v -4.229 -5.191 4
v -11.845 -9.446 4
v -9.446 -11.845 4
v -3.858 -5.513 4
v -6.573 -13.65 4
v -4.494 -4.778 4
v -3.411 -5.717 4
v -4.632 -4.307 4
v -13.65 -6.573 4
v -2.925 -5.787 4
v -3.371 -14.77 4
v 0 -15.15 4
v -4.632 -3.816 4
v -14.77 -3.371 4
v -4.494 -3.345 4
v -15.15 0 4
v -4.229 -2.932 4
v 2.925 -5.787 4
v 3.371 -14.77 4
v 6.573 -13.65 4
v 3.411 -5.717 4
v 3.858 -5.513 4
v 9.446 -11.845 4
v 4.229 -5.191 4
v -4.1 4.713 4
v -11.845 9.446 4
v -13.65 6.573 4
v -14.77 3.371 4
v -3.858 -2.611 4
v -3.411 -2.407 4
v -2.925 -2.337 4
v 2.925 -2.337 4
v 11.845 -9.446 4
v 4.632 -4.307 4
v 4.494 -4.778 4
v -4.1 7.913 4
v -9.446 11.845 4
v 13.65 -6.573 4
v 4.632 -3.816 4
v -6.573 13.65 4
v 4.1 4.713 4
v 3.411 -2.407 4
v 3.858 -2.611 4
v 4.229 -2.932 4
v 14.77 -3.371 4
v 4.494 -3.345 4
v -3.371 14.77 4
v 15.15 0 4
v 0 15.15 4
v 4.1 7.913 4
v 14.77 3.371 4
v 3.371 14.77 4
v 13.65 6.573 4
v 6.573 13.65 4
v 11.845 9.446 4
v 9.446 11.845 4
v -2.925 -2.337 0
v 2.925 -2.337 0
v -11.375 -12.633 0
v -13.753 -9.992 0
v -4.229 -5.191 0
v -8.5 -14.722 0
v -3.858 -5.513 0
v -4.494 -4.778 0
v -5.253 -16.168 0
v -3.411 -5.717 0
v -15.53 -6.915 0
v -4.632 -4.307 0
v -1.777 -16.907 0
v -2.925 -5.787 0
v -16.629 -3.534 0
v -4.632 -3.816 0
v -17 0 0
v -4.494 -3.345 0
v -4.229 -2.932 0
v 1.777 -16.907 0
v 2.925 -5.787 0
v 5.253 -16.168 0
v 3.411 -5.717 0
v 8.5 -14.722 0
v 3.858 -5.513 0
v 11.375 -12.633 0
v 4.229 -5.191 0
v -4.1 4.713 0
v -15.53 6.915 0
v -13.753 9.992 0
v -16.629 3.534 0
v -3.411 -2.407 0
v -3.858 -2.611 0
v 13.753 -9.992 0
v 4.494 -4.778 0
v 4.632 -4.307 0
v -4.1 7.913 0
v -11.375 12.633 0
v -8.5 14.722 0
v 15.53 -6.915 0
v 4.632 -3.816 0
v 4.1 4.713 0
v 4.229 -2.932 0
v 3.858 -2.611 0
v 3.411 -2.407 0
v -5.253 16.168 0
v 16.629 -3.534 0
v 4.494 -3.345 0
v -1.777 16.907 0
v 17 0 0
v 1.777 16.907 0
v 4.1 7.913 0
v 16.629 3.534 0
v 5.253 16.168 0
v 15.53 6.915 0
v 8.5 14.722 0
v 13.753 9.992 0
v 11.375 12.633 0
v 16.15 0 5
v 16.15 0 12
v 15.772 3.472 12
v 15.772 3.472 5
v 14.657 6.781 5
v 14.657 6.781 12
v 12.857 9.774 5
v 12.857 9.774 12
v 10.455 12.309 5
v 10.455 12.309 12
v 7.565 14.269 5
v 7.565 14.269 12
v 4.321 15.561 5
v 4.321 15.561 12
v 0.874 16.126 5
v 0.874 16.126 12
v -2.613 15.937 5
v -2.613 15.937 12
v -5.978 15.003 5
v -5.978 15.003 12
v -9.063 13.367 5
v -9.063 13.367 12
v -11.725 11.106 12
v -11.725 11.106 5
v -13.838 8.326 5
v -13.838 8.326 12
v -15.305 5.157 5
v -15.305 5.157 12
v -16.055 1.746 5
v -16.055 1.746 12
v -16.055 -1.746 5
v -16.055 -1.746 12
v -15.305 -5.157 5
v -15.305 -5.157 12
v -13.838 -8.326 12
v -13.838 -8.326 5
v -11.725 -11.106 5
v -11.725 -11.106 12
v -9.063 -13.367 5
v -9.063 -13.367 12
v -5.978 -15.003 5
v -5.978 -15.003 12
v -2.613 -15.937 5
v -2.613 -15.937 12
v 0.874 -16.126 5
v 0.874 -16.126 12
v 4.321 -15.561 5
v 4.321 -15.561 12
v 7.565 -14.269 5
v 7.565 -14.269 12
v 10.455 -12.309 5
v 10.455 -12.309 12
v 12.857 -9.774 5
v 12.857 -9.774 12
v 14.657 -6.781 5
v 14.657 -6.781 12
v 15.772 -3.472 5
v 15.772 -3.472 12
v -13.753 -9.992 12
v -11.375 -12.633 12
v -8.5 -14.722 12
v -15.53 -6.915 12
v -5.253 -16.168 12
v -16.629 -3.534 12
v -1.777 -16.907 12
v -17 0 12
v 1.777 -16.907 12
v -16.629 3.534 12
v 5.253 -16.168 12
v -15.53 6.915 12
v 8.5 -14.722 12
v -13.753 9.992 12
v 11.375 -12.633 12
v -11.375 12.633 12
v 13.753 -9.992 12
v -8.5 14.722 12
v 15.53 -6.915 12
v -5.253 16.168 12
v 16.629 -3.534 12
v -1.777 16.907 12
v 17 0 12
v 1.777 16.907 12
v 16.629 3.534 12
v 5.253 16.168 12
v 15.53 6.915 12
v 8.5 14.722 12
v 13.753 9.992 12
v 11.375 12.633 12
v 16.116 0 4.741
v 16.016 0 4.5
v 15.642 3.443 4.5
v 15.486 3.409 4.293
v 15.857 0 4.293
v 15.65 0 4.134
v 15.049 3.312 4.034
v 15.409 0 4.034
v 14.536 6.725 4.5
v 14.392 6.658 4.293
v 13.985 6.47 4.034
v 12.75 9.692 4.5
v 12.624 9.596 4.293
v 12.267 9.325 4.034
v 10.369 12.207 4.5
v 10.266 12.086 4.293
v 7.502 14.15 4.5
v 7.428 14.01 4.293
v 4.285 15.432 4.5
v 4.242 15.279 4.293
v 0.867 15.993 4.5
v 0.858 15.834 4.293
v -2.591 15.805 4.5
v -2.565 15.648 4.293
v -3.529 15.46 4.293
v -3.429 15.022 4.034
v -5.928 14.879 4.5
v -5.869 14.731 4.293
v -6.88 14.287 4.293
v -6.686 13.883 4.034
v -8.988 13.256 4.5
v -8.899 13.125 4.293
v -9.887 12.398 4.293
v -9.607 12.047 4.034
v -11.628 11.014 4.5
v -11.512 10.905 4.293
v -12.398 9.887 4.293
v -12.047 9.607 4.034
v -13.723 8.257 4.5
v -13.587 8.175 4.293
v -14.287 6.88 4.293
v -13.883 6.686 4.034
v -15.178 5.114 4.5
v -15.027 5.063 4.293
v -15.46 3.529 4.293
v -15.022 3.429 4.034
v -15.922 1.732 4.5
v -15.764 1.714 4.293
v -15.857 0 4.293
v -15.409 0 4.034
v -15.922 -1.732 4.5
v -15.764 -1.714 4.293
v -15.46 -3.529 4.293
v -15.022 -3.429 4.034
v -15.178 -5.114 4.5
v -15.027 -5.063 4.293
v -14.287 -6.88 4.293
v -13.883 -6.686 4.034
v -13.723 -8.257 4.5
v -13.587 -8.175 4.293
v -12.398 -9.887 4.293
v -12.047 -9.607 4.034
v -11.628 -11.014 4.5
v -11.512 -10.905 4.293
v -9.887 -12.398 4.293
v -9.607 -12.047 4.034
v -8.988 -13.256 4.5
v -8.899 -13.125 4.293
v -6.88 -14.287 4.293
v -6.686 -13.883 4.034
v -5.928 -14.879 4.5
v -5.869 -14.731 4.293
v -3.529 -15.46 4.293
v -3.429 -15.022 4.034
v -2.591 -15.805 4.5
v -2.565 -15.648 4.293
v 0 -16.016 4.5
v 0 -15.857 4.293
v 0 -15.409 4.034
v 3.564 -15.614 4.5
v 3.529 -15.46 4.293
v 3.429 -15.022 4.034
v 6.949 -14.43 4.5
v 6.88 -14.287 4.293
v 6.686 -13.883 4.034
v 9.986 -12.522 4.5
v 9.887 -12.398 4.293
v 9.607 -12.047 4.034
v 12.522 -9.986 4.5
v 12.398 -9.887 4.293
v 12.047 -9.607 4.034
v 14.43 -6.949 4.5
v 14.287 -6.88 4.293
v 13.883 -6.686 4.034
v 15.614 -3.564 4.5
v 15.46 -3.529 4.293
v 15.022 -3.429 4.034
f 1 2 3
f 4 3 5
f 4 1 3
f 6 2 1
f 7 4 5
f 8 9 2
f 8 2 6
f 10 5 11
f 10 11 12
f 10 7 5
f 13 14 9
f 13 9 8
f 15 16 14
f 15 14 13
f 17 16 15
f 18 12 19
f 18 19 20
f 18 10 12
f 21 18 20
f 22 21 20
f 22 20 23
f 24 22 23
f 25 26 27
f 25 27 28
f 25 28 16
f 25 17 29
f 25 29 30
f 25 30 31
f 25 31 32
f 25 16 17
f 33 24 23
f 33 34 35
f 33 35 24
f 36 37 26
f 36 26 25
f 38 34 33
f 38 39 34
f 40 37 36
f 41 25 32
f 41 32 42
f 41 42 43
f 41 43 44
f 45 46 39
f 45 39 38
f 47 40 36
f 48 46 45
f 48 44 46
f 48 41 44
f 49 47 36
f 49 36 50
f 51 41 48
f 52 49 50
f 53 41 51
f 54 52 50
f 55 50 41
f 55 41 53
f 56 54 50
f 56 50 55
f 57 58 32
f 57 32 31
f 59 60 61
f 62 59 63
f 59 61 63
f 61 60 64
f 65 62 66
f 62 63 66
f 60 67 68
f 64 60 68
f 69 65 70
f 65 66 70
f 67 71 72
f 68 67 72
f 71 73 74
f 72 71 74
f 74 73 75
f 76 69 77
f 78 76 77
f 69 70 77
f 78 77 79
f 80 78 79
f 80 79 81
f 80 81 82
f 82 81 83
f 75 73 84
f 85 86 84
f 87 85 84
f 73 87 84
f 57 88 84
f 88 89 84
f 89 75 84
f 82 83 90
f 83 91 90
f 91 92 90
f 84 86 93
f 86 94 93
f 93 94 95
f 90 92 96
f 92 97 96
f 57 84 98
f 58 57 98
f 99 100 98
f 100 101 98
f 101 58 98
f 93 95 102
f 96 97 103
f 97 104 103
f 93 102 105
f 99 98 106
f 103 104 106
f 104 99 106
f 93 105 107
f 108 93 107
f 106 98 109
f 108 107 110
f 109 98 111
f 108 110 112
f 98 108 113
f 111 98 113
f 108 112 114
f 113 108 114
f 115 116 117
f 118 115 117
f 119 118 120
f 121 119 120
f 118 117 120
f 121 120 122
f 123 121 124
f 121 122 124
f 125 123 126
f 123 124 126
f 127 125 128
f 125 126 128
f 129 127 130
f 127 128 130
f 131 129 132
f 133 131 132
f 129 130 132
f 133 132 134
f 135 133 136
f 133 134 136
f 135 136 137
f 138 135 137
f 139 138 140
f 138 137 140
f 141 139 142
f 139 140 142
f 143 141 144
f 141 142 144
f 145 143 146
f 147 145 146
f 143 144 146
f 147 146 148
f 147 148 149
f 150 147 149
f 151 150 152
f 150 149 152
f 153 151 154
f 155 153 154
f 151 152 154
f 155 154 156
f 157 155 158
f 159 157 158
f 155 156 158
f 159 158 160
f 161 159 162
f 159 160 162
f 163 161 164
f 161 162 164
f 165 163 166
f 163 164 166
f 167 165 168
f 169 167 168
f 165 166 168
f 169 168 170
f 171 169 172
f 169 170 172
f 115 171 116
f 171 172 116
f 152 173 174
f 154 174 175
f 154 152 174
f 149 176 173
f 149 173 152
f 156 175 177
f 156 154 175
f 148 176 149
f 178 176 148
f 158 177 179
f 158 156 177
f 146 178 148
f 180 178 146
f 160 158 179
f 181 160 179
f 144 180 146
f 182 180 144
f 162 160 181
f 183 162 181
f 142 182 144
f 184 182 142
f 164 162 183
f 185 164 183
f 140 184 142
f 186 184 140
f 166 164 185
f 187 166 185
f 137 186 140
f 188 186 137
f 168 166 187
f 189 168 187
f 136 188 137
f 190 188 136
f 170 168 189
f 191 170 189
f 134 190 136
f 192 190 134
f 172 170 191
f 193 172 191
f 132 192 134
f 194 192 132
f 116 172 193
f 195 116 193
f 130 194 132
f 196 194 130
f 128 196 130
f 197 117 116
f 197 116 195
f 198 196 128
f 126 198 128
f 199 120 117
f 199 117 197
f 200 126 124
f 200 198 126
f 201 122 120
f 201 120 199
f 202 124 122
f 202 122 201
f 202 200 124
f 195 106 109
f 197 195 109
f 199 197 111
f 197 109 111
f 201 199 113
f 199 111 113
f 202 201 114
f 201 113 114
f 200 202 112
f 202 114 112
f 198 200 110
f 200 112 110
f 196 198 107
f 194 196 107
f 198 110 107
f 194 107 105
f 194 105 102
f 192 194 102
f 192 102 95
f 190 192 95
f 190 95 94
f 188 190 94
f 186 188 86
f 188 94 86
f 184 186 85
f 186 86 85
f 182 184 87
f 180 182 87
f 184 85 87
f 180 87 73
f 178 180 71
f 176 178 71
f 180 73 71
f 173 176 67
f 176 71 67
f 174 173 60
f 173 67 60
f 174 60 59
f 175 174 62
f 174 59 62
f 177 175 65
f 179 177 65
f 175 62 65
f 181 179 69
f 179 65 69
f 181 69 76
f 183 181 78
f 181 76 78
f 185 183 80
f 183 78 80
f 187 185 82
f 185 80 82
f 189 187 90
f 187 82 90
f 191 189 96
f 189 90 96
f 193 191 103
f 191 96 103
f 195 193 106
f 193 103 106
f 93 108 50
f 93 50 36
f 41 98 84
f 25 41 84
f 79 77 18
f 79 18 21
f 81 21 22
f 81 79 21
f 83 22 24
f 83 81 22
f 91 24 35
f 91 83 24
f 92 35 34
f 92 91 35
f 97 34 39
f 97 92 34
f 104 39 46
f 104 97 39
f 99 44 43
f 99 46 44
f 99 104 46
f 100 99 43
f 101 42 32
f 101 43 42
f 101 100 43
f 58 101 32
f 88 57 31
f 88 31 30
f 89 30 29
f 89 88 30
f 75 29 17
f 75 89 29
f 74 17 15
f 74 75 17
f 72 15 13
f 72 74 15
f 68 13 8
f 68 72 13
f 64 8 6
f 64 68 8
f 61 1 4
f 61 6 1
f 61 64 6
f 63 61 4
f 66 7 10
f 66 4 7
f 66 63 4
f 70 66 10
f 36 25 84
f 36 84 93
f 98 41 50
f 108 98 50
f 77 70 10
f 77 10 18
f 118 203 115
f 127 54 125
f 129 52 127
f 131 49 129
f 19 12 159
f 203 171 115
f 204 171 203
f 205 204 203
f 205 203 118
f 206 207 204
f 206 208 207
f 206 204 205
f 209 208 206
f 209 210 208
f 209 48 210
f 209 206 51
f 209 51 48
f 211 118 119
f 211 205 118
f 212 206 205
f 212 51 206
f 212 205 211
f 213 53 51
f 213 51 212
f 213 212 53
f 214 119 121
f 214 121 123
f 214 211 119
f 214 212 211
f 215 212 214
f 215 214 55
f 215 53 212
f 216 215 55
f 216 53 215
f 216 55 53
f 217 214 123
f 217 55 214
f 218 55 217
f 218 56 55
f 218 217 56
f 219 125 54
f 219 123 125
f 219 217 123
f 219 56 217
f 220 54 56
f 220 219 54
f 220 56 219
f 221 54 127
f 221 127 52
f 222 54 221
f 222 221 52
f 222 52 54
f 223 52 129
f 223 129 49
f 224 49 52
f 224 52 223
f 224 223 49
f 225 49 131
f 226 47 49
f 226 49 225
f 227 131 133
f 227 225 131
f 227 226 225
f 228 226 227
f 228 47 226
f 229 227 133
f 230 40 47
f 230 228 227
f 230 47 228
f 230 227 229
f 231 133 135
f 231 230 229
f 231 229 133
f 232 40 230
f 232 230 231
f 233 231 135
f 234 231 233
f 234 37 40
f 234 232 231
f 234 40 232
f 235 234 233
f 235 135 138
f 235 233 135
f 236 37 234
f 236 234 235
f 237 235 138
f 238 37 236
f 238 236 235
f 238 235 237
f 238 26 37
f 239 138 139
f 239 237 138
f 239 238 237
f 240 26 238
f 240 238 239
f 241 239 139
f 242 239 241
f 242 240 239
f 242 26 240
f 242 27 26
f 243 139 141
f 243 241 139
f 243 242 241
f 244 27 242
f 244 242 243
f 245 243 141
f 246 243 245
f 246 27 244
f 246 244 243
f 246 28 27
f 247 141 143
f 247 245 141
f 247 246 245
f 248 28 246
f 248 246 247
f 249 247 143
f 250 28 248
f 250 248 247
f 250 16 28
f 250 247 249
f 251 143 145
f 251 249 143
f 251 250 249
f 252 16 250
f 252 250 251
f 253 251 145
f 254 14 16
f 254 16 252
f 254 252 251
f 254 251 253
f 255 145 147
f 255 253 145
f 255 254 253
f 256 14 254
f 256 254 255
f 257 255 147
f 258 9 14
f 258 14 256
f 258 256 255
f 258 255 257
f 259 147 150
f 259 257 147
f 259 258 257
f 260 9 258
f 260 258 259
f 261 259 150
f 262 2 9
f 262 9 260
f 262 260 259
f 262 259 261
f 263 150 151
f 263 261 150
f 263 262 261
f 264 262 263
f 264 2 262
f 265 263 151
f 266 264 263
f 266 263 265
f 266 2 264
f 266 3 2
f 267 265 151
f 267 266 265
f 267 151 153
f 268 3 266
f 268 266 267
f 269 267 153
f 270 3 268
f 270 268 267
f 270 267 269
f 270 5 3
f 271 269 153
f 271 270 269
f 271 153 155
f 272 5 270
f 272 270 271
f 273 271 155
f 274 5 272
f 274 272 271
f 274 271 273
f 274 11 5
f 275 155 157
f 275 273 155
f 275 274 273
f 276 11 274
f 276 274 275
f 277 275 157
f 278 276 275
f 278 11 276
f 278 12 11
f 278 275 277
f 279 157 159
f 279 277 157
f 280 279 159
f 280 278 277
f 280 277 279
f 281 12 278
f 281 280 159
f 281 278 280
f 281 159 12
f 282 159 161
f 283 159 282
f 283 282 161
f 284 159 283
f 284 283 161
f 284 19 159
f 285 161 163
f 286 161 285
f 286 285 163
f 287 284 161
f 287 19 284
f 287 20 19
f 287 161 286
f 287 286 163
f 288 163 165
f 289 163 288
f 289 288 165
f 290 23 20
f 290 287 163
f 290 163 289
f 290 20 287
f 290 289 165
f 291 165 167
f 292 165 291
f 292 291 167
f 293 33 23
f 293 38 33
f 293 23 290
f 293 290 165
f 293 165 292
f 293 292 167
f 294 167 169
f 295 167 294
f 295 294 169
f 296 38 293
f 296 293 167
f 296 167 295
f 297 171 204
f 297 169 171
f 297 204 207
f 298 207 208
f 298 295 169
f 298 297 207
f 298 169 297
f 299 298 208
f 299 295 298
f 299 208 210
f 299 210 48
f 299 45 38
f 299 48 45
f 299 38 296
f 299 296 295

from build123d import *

# Parameters (mm, degrees)
SKETCH2_R           = 17
BOSS_EXTRUDE1_DEPTH = 12
SKETCH3_R           = 16.15
SKETCH3_R_2         = 10
CUT_EXTRUDE1_DEPTH  = 8
FILLET1_R           = 1
SKETCH4_W           = 8.2
SKETCH4_H           = 3.2
CUT_EXTRUDE2_DEPTH  = 27.870057685


with BuildPart() as part:
    # Sketch2 → Boss-Extrude1 (new body)
    with BuildSketch(Plane.XY):
        Circle(SKETCH2_R)
    extrude(amount=BOSS_EXTRUDE1_DEPTH)

    # Sketch3 → Cut-Extrude1 (cut)
    # profile 1 of 2: a face of its own
    with BuildSketch(Plane.XY.offset(12)):
        Circle(SKETCH3_R)
        Circle(SKETCH3_R_2, mode=Mode.SUBTRACT)
    # profile 2 of 2: a face of its own
    with BuildSketch(Plane.XY.offset(12)):
        Circle(SKETCH3_R_2)
    extrude(amount=-CUT_EXTRUDE1_DEPTH, mode=Mode.SUBTRACT)

    # Fillet1
    fillet1_edges = [part.edges().sort_by_distance(p)[0] for p in [
        (-16.15, 0, 4),
    ]]
    fillet(fillet1_edges, radius=FILLET1_R)

    # Sketch4 → Cut-Extrude2 (cut, through all)
    with BuildSketch(Plane(origin=(0, 0, 0), x_dir=(-1, 0, 0), z_dir=(0, 0, -1))):
        with Locations((0, 6.312686907)):
            Rectangle(SKETCH4_W, SKETCH4_H)
        with BuildLine():
            Line((2.925, -5.786814383), (-2.925, -5.786814383))
            ThreePointArc((-2.925, -5.786814383), (-4.65, -4.061814383), (-2.925, -2.336814383))
            Line((-2.925, -2.336814383), (2.925, -2.336814383))
            ThreePointArc((2.925, -2.336814383), (4.65, -4.061814383), (2.925, -5.786814383))
        make_face()
    extrude(amount=-CUT_EXTRUDE2_DEPTH, mode=Mode.SUBTRACT)


solid = part.part
